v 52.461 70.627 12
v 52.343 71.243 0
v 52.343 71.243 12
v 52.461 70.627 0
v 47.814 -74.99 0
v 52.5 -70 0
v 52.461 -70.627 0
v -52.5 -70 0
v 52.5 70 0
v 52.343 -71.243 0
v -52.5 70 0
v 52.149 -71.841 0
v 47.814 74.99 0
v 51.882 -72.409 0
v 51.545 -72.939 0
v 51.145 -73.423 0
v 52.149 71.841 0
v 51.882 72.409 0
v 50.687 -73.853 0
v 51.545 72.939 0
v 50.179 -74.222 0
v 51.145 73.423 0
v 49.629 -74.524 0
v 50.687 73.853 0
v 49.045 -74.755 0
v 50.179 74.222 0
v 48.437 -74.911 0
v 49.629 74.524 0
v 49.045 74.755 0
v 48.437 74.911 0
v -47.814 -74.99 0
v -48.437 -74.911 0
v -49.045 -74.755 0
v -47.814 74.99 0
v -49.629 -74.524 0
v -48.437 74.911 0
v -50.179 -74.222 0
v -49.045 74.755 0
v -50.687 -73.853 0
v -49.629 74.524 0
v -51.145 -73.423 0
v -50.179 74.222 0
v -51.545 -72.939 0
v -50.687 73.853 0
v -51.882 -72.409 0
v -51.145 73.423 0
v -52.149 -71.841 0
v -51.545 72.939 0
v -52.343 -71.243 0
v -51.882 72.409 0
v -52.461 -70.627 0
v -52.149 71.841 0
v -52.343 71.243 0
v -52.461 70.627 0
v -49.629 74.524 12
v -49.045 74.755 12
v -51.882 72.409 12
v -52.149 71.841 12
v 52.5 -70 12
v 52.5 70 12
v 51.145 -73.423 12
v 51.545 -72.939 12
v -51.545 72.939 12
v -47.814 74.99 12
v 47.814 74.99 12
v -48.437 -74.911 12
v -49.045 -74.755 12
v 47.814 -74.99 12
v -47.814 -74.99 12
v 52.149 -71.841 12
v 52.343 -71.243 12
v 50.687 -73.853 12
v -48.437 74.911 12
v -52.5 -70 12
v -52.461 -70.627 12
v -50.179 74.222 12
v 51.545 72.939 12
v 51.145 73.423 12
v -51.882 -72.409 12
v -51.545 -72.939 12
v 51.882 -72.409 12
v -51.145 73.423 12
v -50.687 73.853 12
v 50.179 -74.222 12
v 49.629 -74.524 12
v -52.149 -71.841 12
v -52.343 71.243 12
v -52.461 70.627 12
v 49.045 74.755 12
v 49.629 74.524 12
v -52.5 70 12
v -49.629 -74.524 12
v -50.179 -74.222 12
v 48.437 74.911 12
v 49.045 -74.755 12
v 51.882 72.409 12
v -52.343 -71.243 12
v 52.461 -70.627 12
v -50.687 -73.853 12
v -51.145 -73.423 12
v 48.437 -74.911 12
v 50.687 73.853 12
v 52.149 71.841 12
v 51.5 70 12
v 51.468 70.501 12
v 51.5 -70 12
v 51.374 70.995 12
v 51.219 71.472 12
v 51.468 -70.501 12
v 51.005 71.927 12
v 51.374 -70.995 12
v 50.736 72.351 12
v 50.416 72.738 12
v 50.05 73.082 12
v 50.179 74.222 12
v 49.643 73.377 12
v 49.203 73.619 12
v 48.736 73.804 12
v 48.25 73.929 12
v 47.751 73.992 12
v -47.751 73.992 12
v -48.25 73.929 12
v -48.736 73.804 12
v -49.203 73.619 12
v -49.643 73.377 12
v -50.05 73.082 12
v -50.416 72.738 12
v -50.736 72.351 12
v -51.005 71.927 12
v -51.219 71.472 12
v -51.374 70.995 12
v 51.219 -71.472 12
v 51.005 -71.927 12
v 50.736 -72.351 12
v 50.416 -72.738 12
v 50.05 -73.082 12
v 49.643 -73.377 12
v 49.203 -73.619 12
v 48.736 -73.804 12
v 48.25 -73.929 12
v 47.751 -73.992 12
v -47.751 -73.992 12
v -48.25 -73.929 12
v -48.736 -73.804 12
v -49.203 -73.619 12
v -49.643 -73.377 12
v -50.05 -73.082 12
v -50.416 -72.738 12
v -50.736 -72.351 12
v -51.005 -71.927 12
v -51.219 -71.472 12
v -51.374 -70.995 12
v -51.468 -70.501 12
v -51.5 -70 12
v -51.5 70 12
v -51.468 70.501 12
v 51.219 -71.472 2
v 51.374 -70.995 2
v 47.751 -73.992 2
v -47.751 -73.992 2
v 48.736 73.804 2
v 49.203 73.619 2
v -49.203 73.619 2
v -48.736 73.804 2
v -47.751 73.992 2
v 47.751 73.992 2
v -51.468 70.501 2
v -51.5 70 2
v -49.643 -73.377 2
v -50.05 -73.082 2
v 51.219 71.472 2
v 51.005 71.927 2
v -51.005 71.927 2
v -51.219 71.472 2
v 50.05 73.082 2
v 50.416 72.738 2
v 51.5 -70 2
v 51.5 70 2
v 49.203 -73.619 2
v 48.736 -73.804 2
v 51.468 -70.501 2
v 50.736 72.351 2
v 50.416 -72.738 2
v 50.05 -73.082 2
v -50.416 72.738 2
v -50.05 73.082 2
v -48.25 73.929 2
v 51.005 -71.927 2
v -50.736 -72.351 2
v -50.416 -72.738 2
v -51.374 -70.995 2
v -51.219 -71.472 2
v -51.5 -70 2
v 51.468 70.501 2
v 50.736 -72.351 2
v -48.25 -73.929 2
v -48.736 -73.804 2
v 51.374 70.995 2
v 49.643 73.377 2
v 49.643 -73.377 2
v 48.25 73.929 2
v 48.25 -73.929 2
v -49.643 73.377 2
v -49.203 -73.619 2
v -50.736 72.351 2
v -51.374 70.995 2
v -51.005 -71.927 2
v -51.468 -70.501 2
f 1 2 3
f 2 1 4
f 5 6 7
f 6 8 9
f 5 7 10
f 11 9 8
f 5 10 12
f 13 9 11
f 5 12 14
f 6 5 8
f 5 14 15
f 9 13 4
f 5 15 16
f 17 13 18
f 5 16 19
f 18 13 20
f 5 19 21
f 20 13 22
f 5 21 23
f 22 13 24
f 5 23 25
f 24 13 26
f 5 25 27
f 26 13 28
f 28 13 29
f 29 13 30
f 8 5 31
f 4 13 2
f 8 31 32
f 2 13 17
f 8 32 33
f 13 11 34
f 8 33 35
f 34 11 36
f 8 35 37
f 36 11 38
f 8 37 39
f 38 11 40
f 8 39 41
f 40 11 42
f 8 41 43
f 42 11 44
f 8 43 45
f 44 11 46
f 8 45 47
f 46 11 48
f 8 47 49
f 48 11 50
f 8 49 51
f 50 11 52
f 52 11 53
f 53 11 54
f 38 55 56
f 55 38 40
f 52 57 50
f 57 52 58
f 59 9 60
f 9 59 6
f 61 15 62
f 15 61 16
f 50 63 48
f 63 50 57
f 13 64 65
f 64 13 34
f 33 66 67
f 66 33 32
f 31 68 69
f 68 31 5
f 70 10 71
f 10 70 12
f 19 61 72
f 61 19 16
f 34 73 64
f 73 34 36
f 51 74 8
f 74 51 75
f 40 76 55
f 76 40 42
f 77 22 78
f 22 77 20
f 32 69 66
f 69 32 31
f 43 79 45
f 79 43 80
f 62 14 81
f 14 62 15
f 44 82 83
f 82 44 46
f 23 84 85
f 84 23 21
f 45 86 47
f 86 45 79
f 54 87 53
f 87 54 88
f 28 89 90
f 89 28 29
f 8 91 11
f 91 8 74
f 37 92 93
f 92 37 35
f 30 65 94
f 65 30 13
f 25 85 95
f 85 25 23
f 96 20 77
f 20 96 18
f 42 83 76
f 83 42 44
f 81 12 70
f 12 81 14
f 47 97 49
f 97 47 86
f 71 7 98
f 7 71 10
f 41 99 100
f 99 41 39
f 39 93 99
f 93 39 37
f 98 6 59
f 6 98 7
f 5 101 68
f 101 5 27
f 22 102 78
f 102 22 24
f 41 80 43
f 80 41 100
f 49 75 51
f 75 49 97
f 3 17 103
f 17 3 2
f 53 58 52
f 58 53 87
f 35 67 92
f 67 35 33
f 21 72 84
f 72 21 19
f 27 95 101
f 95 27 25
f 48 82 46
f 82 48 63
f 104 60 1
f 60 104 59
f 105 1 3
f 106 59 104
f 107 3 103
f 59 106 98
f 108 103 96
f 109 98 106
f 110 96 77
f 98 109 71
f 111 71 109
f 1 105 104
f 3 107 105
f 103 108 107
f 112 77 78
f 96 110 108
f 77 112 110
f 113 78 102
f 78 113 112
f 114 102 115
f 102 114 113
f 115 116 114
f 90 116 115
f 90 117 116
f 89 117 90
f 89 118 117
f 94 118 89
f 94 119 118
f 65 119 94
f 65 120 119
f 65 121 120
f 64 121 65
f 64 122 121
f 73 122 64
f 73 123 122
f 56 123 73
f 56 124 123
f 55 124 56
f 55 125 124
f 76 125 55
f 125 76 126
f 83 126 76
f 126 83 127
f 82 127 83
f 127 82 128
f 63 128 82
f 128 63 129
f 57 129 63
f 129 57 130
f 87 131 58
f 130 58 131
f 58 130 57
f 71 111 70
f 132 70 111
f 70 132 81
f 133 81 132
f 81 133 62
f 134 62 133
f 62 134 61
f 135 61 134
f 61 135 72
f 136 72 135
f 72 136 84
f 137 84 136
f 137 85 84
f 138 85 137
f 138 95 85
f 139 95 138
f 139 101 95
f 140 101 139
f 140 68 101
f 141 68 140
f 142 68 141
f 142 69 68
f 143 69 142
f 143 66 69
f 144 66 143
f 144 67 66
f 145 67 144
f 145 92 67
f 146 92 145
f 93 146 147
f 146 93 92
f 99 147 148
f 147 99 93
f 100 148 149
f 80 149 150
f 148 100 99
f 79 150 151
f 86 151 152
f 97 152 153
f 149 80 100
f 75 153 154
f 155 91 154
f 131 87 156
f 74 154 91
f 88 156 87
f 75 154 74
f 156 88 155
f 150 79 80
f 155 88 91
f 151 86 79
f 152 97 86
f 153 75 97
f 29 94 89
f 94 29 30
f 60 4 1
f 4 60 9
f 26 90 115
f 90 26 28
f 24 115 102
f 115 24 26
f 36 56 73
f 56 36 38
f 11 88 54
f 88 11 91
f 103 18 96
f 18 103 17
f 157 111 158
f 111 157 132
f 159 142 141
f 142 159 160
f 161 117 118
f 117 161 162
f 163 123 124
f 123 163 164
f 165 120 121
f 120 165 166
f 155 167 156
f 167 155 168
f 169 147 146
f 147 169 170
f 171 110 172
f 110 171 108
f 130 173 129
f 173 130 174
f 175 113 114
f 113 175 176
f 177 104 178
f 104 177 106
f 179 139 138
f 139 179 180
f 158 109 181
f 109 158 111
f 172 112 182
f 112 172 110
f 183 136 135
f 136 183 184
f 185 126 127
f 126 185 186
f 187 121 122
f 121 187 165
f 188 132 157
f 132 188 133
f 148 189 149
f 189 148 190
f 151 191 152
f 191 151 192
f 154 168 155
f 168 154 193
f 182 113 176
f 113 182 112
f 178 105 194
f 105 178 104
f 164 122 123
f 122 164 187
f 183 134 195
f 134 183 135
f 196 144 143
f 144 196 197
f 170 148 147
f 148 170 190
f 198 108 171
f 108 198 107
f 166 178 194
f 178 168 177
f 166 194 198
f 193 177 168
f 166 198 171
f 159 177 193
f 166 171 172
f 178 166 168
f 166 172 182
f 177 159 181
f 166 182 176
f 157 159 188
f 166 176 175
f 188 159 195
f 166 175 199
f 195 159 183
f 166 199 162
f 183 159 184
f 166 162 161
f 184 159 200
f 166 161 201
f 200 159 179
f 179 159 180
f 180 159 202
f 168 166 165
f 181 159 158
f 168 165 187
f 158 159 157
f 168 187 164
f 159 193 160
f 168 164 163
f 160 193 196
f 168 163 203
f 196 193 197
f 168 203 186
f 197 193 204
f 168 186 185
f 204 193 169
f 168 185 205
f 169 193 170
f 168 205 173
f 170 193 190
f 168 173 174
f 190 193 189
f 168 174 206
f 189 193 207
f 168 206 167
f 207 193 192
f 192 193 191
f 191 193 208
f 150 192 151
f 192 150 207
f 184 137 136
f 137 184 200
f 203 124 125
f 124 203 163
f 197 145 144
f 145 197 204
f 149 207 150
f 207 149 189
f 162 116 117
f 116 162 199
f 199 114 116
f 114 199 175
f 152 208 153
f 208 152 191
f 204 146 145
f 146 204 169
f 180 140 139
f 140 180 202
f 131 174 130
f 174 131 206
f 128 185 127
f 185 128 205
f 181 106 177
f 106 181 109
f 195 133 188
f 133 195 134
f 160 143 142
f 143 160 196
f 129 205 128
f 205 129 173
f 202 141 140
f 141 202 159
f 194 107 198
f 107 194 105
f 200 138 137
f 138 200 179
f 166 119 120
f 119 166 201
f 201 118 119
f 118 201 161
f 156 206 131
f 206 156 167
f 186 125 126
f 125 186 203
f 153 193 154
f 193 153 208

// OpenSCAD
$fn = 50;


difference() {
	union() {
		hull() {
			translate(v = [-47.5000000000, 70.0000000000, 0]) {
				cylinder(h = 12, r = 5);
			}
			translate(v = [47.5000000000, 70.0000000000, 0]) {
				cylinder(h = 12, r = 5);
			}
			translate(v = [-47.5000000000, -70.0000000000, 0]) {
				cylinder(h = 12, r = 5);
			}
			translate(v = [47.5000000000, -70.0000000000, 0]) {
				cylinder(h = 12, r = 5);
			}
		}
	}
	union() {
		translate(v = [0, 0, 2]) {
			hull() {
				translate(v = [-47.5000000000, 70.0000000000, 0]) {
					cylinder(h = 10, r = 4);
				}
				translate(v = [47.5000000000, 70.0000000000, 0]) {
					cylinder(h = 10, r = 4);
				}
				translate(v = [-47.5000000000, -70.0000000000, 0]) {
					cylinder(h = 10, r = 4);
				}
				translate(v = [47.5000000000, -70.0000000000, 0]) {
					cylinder(h = 10, r = 4);
				}
			}
		}
	}
}
